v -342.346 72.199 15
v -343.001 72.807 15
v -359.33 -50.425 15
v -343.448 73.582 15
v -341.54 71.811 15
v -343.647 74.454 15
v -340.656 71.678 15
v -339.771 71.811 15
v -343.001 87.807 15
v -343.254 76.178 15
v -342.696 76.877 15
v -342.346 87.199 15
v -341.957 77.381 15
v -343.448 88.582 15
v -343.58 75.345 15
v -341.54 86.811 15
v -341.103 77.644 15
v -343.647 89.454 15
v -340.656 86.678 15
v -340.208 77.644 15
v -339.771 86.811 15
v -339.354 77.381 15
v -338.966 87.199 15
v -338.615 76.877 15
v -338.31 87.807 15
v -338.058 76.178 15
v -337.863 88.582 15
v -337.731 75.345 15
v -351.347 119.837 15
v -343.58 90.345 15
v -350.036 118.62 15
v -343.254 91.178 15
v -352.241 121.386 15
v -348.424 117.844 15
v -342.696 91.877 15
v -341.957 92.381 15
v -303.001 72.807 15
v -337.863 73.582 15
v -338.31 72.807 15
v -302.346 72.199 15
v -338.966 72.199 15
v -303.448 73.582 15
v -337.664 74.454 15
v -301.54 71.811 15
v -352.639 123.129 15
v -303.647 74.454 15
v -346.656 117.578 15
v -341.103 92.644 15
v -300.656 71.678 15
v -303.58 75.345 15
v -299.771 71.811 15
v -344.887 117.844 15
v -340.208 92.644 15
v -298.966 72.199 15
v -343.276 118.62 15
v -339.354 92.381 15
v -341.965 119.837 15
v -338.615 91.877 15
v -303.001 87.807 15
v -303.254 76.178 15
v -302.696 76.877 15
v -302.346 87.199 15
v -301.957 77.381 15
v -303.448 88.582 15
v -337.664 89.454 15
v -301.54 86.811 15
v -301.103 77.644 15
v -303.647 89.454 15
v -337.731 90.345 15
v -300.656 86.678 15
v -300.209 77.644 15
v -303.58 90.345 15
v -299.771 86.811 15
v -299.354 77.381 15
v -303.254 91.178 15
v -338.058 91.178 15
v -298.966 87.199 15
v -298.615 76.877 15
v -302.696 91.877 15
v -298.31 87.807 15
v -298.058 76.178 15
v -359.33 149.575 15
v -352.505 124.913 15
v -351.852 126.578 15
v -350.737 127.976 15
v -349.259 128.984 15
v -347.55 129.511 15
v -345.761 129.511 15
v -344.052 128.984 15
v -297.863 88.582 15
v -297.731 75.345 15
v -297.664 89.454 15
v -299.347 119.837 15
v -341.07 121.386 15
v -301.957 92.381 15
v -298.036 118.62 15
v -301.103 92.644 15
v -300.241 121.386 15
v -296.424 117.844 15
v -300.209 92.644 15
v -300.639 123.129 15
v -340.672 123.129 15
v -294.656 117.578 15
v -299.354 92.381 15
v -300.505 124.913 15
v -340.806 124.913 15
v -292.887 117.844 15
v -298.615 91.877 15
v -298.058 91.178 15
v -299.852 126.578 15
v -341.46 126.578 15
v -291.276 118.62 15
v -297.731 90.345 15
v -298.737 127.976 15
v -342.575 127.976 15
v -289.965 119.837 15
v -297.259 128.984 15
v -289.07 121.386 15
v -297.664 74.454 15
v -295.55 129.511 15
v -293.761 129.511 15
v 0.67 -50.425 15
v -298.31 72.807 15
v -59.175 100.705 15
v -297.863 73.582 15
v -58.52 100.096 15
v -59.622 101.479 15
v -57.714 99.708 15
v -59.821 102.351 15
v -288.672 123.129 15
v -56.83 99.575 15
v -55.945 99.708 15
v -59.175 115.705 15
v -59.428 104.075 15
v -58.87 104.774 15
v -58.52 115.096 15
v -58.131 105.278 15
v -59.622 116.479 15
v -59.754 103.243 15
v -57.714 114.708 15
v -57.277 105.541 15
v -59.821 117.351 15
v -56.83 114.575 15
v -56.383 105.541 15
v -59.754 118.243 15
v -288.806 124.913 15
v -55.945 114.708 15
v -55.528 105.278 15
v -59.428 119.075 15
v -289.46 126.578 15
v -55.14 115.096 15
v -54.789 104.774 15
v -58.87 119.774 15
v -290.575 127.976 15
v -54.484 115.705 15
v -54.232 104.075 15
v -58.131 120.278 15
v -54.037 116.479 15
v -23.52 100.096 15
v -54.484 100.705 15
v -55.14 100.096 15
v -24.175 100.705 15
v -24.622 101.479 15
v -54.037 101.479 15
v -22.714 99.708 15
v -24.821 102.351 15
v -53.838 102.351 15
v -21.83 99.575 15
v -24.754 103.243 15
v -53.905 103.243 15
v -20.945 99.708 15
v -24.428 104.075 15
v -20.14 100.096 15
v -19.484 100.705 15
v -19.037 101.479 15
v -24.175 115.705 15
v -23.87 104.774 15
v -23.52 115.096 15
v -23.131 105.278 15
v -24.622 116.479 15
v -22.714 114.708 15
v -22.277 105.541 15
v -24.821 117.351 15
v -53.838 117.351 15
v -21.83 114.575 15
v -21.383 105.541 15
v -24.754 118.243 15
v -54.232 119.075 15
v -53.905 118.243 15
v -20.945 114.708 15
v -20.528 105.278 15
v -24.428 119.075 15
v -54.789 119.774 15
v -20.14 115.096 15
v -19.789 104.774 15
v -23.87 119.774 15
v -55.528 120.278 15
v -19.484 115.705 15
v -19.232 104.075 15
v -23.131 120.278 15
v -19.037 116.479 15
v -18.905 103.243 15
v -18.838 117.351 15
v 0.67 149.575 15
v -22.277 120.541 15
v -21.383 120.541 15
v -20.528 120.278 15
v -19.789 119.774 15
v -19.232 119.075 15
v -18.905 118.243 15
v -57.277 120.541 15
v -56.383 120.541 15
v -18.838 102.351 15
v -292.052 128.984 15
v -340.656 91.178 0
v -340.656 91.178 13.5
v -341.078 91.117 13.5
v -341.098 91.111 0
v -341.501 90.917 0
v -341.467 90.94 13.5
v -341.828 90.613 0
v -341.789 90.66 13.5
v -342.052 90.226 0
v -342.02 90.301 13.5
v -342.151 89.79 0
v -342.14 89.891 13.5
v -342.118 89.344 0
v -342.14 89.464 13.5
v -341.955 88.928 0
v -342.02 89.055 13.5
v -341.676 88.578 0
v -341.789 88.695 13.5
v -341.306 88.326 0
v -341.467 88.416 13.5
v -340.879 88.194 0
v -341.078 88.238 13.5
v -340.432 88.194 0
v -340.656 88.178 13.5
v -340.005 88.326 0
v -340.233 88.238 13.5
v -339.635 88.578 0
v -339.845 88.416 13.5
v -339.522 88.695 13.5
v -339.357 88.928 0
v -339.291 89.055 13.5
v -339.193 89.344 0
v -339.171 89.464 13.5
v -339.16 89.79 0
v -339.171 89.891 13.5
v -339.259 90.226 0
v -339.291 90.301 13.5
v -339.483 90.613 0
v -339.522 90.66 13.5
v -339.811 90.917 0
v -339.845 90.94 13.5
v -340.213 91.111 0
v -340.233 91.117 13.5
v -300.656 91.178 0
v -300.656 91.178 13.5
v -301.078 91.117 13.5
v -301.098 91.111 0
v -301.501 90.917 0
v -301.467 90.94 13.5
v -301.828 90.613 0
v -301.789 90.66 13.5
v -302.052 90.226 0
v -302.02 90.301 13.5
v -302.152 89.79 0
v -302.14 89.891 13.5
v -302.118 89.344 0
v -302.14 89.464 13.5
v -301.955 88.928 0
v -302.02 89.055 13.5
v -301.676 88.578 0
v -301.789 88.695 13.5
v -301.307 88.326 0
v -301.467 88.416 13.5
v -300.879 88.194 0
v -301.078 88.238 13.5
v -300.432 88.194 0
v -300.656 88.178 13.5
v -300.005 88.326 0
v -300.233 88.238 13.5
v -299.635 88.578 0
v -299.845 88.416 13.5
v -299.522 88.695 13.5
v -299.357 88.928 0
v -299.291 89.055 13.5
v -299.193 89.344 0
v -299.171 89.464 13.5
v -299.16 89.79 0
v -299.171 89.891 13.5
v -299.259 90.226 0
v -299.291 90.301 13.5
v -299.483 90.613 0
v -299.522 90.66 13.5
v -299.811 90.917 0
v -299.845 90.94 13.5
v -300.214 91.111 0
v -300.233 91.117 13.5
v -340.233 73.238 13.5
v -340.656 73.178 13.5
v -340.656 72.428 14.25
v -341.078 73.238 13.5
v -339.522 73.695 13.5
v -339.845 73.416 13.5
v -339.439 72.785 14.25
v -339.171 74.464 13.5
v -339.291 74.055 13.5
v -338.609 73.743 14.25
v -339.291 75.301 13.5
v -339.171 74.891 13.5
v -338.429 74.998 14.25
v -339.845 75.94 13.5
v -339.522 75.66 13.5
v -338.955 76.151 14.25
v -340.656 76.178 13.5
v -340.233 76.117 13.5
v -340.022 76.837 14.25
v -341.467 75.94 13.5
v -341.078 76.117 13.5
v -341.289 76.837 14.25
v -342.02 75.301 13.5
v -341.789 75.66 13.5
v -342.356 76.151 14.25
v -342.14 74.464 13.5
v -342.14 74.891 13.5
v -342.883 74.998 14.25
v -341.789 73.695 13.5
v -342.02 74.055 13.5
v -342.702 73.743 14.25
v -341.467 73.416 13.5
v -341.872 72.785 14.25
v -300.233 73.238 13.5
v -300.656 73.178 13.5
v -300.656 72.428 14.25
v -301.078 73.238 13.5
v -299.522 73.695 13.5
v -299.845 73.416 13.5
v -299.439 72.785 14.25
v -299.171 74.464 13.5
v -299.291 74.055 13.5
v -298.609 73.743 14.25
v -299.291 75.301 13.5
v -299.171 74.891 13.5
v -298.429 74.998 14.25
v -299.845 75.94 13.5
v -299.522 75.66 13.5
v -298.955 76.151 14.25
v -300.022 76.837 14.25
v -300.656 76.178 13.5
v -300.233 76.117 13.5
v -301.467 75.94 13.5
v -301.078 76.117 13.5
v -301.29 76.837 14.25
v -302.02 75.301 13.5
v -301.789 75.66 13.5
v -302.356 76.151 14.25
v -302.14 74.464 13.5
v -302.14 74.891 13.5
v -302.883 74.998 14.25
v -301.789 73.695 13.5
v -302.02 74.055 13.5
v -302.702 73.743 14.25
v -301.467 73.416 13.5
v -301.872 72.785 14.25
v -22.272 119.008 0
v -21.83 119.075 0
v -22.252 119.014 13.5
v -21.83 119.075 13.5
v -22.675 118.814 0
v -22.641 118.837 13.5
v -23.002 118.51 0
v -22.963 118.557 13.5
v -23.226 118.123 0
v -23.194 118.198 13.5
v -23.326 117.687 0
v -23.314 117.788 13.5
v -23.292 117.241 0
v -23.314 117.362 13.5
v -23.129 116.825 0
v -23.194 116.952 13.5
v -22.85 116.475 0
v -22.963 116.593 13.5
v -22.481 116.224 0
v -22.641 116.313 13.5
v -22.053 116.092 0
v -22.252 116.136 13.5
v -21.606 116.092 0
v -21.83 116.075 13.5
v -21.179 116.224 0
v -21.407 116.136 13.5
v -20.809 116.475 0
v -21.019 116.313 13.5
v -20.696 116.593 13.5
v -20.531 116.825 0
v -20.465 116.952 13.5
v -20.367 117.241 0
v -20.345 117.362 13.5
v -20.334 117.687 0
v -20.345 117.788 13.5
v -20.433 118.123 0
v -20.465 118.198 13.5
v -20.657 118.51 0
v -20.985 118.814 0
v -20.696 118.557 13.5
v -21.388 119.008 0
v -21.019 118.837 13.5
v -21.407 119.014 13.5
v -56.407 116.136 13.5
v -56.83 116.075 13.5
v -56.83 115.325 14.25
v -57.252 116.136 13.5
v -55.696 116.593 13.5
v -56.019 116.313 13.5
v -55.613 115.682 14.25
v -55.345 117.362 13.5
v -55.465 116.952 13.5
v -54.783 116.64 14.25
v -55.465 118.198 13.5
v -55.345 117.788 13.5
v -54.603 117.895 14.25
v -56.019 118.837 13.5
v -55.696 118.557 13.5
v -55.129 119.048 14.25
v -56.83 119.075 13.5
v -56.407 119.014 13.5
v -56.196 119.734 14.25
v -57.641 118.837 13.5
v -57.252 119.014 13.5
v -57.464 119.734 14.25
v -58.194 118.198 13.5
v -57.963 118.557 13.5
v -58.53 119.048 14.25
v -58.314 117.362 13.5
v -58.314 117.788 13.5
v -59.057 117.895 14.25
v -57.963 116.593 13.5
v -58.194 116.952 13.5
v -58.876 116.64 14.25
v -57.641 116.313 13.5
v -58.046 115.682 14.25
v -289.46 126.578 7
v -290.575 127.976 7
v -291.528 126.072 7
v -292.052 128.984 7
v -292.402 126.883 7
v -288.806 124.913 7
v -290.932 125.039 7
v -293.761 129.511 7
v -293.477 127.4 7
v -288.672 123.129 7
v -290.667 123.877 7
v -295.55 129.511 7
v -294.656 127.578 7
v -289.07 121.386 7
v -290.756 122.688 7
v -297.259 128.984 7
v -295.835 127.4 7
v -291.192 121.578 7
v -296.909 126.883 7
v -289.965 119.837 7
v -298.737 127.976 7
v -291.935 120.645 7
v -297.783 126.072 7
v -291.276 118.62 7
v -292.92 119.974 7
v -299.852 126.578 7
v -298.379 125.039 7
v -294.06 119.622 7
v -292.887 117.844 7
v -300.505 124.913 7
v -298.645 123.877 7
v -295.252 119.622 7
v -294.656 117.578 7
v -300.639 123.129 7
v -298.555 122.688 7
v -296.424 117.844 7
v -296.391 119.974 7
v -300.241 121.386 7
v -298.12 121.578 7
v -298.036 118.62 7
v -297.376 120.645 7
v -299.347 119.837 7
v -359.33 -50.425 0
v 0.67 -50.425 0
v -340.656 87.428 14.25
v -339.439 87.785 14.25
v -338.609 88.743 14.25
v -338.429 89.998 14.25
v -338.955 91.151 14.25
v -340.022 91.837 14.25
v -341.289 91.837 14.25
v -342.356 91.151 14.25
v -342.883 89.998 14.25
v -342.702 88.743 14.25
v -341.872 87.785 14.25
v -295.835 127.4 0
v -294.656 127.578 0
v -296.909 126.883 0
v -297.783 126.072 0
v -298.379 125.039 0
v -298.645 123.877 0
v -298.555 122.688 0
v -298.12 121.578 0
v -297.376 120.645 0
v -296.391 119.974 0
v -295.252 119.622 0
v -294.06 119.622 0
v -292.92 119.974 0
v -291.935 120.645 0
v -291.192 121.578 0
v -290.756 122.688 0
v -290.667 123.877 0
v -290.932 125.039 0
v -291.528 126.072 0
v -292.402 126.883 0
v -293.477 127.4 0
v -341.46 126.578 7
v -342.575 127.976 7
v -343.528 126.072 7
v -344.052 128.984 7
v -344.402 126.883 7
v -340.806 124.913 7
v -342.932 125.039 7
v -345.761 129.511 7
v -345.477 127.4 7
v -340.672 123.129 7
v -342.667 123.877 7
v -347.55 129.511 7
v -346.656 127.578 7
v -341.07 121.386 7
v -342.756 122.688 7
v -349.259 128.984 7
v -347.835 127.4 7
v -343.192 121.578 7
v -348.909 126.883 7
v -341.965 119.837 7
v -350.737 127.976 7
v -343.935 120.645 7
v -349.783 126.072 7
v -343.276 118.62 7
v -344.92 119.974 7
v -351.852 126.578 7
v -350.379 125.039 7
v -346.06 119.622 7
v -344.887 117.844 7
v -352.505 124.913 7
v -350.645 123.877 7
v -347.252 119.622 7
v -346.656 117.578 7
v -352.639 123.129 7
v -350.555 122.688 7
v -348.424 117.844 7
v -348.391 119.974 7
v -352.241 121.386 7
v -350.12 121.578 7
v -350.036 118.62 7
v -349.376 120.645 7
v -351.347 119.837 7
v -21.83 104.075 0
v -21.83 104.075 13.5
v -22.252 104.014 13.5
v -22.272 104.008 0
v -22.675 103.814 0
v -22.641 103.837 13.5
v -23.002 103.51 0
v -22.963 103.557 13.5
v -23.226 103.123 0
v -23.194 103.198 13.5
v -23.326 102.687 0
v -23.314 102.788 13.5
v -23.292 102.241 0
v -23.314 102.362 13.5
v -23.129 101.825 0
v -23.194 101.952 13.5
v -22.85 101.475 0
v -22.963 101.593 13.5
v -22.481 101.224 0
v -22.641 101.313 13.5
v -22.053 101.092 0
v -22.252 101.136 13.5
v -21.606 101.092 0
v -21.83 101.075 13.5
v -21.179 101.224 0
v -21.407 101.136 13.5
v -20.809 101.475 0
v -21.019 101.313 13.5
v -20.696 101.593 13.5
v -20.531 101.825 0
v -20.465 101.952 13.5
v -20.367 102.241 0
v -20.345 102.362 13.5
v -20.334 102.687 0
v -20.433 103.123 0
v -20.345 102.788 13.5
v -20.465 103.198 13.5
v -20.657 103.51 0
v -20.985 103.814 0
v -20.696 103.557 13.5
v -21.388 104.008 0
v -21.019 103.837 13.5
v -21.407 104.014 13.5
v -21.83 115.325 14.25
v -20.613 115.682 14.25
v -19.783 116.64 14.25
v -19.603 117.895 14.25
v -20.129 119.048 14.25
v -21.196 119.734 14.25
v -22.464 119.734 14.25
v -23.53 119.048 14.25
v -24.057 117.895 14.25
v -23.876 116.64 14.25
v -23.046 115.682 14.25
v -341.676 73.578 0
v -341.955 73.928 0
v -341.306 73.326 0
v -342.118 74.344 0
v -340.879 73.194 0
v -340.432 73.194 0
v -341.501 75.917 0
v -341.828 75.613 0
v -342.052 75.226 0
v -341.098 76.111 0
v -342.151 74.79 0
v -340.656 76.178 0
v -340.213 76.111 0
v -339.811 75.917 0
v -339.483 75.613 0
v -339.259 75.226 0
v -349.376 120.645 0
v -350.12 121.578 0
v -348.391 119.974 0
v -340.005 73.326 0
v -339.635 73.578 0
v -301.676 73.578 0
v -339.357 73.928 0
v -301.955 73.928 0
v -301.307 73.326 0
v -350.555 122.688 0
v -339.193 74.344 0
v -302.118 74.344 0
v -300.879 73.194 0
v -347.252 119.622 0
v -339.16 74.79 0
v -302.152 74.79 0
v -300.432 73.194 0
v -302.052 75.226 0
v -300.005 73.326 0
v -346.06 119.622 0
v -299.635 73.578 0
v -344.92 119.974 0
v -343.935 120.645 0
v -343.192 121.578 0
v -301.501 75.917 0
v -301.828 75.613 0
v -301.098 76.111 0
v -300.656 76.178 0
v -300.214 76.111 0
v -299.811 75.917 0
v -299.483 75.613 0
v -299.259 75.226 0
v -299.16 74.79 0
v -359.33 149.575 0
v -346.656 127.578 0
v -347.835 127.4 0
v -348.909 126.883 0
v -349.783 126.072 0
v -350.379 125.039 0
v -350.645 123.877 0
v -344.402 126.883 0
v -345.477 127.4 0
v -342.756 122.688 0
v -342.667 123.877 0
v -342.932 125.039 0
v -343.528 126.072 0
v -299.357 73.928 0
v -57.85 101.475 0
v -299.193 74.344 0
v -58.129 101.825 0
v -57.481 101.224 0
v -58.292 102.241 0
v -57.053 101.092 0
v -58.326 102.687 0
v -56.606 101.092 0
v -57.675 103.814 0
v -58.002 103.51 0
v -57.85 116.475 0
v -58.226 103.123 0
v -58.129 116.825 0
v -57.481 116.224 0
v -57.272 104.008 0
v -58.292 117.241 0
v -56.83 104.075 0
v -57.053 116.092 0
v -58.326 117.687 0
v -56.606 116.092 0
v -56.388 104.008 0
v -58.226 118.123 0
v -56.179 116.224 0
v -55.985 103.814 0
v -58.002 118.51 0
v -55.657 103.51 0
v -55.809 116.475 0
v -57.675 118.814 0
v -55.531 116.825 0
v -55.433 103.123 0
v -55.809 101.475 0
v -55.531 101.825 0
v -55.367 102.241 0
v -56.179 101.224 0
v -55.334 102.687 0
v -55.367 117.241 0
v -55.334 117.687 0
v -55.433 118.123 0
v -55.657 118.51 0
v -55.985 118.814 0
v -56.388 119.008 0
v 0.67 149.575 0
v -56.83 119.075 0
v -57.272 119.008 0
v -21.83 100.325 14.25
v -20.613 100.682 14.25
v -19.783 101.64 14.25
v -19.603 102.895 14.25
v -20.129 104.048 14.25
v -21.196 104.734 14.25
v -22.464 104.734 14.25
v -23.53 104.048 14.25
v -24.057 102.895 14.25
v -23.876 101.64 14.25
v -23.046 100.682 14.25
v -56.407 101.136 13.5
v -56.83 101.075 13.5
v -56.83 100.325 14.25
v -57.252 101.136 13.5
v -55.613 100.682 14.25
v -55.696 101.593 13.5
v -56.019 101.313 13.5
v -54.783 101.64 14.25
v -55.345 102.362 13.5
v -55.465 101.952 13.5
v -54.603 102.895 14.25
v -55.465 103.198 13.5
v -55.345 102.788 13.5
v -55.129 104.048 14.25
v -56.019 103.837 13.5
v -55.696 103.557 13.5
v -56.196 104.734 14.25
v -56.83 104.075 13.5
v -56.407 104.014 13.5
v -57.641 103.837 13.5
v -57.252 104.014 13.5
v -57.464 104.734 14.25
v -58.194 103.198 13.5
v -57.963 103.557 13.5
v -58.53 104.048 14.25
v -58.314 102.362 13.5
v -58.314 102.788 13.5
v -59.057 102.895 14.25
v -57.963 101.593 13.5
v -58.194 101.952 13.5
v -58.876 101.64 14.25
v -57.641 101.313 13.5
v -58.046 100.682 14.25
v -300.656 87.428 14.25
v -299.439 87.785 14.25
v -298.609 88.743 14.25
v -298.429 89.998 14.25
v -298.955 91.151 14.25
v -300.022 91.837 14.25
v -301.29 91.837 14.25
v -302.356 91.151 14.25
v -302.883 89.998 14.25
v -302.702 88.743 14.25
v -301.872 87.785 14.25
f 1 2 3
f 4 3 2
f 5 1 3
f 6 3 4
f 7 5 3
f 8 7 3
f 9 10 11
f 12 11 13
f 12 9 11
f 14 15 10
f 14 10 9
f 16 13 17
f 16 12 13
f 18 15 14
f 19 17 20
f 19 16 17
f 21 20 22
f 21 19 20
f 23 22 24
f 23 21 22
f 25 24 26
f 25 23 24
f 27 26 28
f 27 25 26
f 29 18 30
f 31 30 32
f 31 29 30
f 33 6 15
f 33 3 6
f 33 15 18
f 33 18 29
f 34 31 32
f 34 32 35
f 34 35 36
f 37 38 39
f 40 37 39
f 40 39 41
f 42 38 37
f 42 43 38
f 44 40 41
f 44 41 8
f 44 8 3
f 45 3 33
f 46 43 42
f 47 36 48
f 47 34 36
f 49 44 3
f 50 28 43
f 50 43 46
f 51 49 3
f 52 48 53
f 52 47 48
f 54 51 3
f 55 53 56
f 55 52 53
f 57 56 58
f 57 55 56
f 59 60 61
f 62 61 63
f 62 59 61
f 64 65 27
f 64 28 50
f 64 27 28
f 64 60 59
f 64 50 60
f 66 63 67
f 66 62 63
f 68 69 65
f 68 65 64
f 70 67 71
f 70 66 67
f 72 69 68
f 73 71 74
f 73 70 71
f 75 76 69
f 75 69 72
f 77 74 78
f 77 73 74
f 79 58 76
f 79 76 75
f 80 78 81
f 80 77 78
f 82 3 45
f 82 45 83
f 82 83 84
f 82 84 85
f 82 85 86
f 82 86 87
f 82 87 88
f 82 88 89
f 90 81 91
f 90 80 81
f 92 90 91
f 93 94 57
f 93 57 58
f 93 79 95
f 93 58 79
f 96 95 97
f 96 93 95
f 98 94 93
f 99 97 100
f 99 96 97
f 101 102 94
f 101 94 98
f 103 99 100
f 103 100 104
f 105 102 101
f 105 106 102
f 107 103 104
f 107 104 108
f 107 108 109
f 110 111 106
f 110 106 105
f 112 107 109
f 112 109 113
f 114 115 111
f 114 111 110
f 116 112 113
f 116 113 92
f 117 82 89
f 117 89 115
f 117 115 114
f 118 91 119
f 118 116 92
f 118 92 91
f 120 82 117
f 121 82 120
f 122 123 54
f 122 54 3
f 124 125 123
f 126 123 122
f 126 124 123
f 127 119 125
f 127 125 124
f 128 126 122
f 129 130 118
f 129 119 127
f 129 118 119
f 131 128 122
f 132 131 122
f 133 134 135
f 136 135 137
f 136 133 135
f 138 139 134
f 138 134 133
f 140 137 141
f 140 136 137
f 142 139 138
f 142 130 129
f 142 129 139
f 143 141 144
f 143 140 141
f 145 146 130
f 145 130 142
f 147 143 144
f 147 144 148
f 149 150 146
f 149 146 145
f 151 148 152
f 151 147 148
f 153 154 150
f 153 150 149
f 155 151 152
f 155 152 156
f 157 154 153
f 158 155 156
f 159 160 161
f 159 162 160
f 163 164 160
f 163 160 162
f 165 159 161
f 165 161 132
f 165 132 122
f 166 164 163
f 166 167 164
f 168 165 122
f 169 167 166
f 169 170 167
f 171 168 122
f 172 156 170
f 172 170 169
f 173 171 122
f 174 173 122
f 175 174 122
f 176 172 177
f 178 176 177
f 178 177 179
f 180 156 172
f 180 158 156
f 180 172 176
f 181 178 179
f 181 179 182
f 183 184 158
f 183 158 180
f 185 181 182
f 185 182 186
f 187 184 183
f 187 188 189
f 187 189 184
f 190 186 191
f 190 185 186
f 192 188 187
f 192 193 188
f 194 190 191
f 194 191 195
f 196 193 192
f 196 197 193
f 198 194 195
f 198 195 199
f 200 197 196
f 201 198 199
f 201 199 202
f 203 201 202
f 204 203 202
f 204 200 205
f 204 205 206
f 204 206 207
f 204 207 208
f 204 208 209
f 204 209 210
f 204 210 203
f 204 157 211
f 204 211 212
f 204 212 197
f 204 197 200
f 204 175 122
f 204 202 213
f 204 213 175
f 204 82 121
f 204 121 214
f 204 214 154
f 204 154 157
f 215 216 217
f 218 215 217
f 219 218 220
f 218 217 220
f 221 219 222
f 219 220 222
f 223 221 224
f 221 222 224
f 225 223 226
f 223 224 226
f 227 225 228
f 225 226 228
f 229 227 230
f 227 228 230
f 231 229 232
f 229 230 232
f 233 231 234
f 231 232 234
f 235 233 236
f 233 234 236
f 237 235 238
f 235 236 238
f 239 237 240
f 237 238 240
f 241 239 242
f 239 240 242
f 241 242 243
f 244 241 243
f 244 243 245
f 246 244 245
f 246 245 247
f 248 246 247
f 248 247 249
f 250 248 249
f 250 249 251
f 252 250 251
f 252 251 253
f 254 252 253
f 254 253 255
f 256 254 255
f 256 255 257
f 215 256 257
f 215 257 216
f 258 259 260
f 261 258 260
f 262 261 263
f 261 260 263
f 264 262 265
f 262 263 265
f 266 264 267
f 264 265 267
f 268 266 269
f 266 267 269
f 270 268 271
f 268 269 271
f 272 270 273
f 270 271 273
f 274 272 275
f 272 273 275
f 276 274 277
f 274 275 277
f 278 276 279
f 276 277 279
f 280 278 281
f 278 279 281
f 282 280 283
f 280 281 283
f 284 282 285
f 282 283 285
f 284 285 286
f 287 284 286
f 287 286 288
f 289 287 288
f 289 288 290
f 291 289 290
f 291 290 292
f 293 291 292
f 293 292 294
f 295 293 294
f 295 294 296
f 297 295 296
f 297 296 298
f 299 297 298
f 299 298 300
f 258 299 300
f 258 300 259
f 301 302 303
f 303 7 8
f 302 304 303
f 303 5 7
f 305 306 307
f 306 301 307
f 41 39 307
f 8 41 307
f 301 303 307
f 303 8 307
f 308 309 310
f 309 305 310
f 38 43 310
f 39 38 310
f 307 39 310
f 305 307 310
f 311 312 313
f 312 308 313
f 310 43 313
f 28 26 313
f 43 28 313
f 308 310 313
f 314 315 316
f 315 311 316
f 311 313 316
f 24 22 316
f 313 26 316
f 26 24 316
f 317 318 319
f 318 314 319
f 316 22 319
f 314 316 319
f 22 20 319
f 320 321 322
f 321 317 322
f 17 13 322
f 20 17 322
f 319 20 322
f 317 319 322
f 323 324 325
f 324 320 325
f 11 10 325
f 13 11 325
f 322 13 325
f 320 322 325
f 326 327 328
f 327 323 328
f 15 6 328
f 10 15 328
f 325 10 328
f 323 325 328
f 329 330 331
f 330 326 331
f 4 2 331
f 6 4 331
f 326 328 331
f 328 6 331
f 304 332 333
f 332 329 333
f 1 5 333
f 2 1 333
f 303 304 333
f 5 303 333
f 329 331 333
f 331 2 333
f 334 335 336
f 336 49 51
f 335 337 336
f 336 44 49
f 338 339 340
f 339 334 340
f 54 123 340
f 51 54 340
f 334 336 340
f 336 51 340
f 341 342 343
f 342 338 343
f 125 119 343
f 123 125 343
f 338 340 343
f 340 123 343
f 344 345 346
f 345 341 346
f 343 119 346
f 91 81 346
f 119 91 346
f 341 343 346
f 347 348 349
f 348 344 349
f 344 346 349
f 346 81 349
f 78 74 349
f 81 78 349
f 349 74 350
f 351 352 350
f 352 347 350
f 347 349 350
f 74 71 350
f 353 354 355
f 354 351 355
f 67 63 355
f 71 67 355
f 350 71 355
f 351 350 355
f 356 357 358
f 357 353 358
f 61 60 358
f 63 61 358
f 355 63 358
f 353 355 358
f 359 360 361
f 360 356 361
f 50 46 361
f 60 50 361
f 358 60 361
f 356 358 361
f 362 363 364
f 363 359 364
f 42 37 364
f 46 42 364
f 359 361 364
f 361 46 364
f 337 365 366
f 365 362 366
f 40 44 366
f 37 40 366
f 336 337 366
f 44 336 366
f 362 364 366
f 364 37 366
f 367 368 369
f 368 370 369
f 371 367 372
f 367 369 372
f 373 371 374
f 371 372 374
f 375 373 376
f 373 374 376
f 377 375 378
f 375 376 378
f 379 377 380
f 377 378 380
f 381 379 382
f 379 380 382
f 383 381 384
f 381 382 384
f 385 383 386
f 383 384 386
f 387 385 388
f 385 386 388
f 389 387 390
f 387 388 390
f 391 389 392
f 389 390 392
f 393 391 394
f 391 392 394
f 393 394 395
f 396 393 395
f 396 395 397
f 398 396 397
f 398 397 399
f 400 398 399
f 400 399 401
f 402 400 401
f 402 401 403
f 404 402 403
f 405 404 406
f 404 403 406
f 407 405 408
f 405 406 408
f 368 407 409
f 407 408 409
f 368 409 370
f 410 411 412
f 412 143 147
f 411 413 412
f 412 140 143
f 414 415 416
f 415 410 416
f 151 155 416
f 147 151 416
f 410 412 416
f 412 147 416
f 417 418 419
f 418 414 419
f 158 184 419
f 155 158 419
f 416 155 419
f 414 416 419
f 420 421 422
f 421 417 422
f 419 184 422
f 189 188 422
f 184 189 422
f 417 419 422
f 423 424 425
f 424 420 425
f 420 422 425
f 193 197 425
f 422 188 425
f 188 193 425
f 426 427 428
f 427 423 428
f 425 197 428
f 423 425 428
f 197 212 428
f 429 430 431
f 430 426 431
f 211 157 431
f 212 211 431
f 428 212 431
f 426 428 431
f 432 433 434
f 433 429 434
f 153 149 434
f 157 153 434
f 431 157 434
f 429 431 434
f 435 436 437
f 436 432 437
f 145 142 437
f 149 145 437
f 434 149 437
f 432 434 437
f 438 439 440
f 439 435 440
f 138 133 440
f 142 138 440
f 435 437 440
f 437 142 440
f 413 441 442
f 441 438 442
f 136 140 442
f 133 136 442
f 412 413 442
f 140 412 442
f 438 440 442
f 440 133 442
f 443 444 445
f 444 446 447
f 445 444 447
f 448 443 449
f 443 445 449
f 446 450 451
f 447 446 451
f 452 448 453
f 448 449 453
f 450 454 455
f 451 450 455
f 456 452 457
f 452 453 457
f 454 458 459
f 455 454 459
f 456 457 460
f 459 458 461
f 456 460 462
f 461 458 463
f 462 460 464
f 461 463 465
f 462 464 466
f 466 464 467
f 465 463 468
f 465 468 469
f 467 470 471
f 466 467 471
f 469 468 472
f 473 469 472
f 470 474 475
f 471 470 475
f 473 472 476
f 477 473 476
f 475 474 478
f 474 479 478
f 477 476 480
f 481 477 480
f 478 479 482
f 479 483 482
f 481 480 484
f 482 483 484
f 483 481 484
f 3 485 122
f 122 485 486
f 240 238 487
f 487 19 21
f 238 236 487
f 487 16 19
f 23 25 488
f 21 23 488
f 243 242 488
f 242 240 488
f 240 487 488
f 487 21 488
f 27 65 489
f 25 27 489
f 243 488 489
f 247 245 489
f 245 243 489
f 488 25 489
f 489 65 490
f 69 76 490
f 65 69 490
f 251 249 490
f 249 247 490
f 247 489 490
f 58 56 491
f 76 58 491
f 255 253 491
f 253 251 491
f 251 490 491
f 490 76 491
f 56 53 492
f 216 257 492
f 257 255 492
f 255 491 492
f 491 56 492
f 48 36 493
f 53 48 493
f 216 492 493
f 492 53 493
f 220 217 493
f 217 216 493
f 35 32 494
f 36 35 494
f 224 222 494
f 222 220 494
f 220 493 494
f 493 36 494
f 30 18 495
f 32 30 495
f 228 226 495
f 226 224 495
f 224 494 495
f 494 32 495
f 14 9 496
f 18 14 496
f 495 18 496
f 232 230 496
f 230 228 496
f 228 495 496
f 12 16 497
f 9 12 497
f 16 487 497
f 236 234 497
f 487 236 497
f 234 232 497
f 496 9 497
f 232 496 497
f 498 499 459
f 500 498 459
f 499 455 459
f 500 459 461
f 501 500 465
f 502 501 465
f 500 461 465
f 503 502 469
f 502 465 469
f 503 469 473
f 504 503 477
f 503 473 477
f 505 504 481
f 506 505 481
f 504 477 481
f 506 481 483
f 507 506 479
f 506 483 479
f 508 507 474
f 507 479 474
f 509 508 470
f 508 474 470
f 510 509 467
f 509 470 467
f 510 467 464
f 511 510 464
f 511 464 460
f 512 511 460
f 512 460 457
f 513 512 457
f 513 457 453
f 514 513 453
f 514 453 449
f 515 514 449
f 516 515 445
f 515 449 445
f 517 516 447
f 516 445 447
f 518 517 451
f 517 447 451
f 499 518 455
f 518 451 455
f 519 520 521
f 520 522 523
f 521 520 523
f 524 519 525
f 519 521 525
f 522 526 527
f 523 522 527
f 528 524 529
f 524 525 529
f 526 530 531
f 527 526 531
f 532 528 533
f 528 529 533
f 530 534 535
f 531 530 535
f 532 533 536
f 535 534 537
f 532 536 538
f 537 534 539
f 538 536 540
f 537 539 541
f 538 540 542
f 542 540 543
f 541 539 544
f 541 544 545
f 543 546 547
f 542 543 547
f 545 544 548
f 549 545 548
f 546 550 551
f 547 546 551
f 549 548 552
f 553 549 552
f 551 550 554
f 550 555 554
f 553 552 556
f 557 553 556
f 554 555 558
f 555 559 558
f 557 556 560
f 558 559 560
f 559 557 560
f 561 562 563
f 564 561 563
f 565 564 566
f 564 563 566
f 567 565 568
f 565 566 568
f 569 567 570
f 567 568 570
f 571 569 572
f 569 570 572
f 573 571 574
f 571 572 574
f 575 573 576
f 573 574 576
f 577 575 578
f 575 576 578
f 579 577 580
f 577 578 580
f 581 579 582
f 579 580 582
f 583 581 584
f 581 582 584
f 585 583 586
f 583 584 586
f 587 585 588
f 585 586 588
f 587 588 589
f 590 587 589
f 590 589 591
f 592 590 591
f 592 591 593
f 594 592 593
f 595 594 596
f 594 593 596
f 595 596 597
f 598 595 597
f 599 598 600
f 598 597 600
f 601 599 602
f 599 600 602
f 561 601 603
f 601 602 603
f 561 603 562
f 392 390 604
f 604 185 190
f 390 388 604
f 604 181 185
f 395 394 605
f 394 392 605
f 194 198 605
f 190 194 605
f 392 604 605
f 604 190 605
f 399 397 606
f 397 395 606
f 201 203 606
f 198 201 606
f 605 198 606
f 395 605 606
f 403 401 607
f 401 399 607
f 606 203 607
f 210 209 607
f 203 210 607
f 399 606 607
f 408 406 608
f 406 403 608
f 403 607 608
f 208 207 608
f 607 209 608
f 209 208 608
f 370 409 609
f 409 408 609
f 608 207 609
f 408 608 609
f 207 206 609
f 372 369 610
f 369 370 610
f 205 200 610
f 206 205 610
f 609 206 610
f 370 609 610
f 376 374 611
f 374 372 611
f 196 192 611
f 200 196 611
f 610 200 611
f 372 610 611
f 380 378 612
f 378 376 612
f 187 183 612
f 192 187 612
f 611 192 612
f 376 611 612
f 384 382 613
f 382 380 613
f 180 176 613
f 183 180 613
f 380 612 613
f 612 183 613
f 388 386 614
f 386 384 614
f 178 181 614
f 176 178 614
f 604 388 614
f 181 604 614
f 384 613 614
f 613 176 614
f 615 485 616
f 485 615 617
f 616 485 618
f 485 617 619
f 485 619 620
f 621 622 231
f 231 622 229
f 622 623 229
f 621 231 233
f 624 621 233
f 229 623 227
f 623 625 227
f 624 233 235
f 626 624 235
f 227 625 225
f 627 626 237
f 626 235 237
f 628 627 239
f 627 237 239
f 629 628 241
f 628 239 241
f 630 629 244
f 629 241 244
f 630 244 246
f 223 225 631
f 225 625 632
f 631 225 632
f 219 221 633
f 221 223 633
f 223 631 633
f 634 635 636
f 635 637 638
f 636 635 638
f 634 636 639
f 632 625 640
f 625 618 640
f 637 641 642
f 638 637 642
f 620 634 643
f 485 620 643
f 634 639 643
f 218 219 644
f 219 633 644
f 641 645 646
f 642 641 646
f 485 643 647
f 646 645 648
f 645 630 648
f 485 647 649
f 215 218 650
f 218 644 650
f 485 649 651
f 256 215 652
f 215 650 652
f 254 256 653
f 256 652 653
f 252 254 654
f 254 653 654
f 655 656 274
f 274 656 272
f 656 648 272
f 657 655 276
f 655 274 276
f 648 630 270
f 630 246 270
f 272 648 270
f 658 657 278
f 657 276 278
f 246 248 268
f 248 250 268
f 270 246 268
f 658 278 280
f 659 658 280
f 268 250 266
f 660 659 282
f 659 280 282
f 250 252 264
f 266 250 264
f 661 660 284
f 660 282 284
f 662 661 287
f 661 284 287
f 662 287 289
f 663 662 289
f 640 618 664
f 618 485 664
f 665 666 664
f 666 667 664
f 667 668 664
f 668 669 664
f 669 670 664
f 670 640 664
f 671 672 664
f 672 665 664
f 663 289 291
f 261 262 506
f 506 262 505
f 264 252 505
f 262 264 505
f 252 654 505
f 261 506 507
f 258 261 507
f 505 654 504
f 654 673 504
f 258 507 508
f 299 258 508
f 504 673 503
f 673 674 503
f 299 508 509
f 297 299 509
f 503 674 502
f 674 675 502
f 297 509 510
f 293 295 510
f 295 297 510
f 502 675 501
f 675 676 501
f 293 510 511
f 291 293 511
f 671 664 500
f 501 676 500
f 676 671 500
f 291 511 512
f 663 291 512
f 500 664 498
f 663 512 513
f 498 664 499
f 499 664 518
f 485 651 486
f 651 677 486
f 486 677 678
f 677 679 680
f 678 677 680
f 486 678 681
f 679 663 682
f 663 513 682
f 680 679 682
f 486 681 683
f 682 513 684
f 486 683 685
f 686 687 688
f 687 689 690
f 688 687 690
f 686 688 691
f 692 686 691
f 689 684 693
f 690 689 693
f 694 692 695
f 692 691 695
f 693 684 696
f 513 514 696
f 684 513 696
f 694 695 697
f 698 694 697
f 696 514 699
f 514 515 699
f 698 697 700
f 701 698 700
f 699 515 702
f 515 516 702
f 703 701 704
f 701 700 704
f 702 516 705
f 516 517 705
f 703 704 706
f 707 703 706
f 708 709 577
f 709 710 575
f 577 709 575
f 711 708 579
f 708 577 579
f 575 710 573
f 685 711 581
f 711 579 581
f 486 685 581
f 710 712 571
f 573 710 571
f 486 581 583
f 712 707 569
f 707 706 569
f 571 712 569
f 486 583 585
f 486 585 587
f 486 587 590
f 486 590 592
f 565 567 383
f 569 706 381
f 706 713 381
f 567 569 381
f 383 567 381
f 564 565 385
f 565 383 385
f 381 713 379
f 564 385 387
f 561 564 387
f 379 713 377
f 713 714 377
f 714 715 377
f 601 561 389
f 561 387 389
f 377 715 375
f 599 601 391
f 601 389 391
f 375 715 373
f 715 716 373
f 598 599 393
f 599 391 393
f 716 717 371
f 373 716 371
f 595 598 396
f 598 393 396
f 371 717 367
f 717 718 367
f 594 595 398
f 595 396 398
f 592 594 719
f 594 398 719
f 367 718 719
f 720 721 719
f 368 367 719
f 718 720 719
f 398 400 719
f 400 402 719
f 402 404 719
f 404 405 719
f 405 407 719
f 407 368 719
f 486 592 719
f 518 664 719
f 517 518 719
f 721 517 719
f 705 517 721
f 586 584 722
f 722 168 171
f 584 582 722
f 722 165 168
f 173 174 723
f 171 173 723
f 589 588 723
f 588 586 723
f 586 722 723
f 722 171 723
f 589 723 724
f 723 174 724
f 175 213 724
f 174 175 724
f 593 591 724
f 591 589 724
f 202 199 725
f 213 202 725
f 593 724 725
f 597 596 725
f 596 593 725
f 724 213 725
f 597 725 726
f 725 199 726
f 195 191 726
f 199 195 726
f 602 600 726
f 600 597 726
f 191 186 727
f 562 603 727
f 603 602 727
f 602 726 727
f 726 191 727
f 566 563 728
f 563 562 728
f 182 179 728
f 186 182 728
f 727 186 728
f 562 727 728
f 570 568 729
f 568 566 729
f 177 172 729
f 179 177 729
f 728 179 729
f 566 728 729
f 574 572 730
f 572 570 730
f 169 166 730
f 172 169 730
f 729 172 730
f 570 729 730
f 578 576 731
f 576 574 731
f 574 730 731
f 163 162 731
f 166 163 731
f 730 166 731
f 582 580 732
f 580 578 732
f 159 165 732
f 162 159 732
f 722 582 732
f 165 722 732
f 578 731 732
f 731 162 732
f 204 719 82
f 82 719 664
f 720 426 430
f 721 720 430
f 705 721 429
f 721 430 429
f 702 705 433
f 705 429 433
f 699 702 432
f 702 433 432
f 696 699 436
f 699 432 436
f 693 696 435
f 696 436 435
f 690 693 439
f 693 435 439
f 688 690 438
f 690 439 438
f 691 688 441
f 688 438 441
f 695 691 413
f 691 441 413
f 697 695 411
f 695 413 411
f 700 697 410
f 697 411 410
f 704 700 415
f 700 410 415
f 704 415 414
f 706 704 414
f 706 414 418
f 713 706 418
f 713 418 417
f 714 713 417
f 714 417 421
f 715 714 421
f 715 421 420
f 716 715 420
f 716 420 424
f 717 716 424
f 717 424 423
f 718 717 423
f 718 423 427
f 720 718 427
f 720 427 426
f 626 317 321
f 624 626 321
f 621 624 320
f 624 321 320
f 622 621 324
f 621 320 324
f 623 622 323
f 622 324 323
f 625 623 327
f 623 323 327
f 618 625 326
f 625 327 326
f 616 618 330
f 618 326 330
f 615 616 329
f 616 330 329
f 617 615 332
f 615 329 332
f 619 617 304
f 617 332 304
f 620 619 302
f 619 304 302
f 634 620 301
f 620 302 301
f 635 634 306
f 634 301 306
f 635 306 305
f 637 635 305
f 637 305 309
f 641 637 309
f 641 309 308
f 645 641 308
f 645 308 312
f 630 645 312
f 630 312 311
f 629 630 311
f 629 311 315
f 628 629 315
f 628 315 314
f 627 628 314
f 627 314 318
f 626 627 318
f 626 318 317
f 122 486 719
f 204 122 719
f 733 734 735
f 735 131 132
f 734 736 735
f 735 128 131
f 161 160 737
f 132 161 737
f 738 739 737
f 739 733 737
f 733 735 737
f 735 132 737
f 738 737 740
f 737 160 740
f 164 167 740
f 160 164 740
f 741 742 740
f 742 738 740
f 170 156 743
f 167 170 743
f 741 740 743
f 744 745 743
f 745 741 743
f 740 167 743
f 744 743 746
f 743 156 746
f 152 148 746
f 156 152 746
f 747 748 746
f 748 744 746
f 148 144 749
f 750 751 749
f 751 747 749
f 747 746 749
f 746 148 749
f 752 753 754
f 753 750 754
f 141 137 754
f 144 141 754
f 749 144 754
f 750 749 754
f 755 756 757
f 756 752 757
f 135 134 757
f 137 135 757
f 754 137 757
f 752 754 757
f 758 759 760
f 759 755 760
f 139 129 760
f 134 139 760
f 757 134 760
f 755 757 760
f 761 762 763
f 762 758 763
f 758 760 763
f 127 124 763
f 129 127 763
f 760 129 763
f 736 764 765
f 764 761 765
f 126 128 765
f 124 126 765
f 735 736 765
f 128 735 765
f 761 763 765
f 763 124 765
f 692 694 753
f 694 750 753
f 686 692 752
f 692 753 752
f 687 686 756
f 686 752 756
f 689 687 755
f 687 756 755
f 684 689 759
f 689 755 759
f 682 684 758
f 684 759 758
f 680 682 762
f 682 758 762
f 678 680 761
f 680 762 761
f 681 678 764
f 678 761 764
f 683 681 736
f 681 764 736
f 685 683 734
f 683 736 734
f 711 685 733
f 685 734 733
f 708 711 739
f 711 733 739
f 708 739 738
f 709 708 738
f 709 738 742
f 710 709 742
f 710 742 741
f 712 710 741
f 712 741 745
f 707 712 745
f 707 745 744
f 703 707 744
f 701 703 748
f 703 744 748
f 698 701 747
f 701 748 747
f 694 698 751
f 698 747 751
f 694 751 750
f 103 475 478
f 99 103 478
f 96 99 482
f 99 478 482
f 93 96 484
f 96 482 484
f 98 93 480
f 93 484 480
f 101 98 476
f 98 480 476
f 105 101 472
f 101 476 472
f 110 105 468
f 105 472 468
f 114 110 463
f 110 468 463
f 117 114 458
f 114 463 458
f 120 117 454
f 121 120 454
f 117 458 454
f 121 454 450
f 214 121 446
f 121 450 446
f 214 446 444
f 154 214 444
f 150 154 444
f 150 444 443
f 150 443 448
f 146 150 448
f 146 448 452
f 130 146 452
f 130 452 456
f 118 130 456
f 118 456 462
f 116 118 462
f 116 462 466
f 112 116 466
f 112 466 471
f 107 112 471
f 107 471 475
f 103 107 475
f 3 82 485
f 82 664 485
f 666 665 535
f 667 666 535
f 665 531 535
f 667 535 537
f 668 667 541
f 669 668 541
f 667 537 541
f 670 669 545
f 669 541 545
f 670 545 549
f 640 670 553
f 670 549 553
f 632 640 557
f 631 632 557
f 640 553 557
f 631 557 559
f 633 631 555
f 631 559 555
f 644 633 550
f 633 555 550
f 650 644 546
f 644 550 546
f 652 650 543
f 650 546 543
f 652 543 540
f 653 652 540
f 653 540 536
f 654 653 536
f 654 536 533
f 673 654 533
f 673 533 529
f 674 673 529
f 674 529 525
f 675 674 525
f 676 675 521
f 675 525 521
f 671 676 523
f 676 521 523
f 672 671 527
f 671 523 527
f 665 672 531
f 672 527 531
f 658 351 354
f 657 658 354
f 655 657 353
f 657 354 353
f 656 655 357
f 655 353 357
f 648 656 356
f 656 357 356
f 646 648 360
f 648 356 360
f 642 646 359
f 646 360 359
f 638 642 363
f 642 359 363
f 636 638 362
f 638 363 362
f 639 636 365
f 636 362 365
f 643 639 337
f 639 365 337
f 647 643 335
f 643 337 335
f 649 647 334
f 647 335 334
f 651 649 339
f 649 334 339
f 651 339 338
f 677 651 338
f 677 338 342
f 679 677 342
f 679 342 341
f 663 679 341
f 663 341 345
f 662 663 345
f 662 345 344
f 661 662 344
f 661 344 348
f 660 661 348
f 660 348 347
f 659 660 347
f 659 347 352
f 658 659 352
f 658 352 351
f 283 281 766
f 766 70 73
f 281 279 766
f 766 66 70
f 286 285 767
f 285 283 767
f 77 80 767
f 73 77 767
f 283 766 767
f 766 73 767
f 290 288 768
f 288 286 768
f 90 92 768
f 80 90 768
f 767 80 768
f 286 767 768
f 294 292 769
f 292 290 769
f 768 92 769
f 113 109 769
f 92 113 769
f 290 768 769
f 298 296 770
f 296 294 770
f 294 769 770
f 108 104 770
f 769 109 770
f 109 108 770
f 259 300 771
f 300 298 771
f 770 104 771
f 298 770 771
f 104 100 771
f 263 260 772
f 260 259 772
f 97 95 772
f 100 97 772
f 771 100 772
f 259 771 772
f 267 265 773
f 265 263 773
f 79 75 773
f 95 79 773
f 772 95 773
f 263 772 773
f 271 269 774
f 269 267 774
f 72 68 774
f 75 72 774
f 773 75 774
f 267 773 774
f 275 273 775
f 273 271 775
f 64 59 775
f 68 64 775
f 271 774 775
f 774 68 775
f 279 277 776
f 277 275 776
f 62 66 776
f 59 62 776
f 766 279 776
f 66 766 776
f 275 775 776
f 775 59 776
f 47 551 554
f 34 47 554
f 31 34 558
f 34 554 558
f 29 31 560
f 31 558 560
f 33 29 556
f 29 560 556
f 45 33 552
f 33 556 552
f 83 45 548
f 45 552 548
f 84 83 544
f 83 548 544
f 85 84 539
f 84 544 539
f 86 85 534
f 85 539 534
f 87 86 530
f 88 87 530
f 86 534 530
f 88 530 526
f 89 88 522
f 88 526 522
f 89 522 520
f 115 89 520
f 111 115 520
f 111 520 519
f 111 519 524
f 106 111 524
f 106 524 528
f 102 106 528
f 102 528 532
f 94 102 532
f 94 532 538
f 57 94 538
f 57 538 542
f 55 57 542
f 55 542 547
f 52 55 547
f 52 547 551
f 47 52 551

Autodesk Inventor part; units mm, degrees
ref_plane "YZ Plane" through (0, 0, 0) normal (1, 0, 0) x (0, 1, 0)
ref_plane "XZ Plane" through (0, 0, 0) normal (0, 1, 0) x (-1, 0, 0)
ref_plane "XY Plane" through (0, 0, 0) normal (0, 0, 1) x (1, 0, 0)
sketch "Sketch1" plane through (0, 0, 0) normal (0, 0, 1) x (1, 0, 0)
  line L0 (0.6703, -50.425) -> (0.6703, 149.575)
  line L1 (0.6703, 149.575) -> (-359.3297, 149.575)
  line L2 (-359.3297, 149.575) -> (-359.3297, -50.425)
  line L3 (-359.3297, -50.425) -> (0.6703, -50.425)
  line L4 (0.6703, -50.425) -> (0.6703, 149.575)
  point P0 (0, 0)
  dimension "d67" = 360
extrude "Extrusion1" add sketch "Sketch1" along normal blind 15
sketch "Sketch7" plane through (0, 0, 0) normal (0, 0, -1) x (-1, 0, 0)
  line L0 (-0.6703, 149.575) -> (359.3297, 149.575) projected
  line L1 (-0.6703, 149.575) -> (359.3297, 149.575) projected
  line L2 (359.3297, 149.575) -> (359.3297, -50.425) projected
  line L3 (-0.6703, -50.425) -> (-0.6703, 149.575) projected
  line L4 (-0.6703, 149.575) -> (-0.6703, 129.575)
  line L5 (-0.6703, 149.575) -> (-0.6703, 119.575)
  line L6 (-0.6703, 119.575) -> (-0.6703, 117.575)
  circle A0 centre (56.8297, 102.575) radius 1.5
  circle A1 centre (56.8297, 117.575) radius 1.5
  circle A2 centre (21.8297, 102.575) radius 1.5
  circle A3 centre (21.8297, 117.575) radius 1.5
  line L7 (359.3297, 149.575) -> (359.3297, -50.425) projected
  line L8 (-0.6703, 117.575) -> (-0.6703, 119.575)
  line L9 (-0.6703, 117.575) -> (-0.6703, 120.575)
  circle A4 centre (300.6557, 89.6777) radius 1.59
  circle A5 centre (300.6557, 74.6777) radius 1.59
  line L10 (16.8297, 102.575) -> (21.8297, 102.575)
  point P0 (0, 0)
  point P1 (300.6557, 74.6777)
  point P2 (340.6556, 74.6777)
  point P3 (340.6556, 89.6777)
  point P4 (335.6556, 88.0877)
  dimension "d70" = 20
  dimension "d155" = 3
hole "Hole10" at (-56.8297, 102.575, 0) at (-56.8297, 117.575, 0) at (-21.8297, 117.575, 0) at (-21.8297, 102.575, 0) direction (0, 0, 1) diameter 3 end through all
hole "Hole11" at (-300.6557, 74.6777, 0) at (-300.6557, 89.6777, 0) at (-340.6556, 74.6777, 0) at (-340.6556, 89.6777, 0) direction (0, 0, 1) diameter 3 end through all
sketch "Sketch11" plane through (0, 0, 15) normal (0, 0, 1) x (1, 0, 0)
  circle A0 centre (-21.8297, 117.575) radius 1.5 projected
  circle A1 centre (-56.8297, 102.575) radius 1.5 projected
  circle A2 centre (-56.8297, 117.575) radius 1.5 projected
  circle A3 centre (-21.8297, 102.575) radius 1.5 projected
  line L0 (0.6703, -50.425) -> (0.6703, 149.575) projected
  line L1 (0.6703, 149.575) -> (-359.3297, 149.575) projected
  line L2 (-359.3297, 149.575) -> (-359.3297, -50.425) projected
  line L3 (-359.3297, -50.425) -> (0.6703, -50.425) projected
  circle A4 centre (-56.8297, 102.575) radius 1.5 projected
  circle A5 centre (-340.6556, 74.6777) radius 1.5 projected
  circle A6 centre (-340.6556, 89.6777) radius 1.5 projected
  circle A7 centre (-340.6556, 74.6777) radius 1.5 projected
  circle A8 centre (-300.6557, 74.6777) radius 1.5 projected
  circle A9 centre (-300.6557, 89.6777) radius 1.5 projected
  circle A10 centre (-340.6556, 89.6777) radius 1.5 projected
  circle A11 centre (-21.8297, 117.575) radius 1.5 projected
  circle A12 centre (-56.8297, 102.575) radius 1.5 projected
  circle A13 centre (-56.8297, 117.575) radius 1.5 projected
  circle A14 centre (-21.8297, 102.575) radius 1.5 projected
  line L4 (0.6703, -50.425) -> (0.6703, 149.575) projected
  line L5 (0.6703, 149.575) -> (-359.3297, 149.575) projected
  line L6 (-359.3297, 149.575) -> (-359.3297, -50.425) projected
  line L7 (-359.3297, -50.425) -> (0.6703, -50.425) projected
  point P0 (0, 0)
hole "Hole12" at (-56.8297, 117.575, 15) at (-56.8297, 102.575, 15) at (-21.8297, 102.575, 15) at (-21.8297, 117.575, 15) at (-300.6557, 74.6777, 15) at (-300.6557, 89.6777, 15) at (-340.6556, 89.6777, 15) at (-340.6556, 74.6777, 15) direction (0, 0, -1) diameter 3 end through all countersink diameter 6 countersink angle 90
sketch "Sketch12" plane through (0, 0, 0) normal (0, 0, -1) x (-1, 0, 0)
  circle A0 centre (294.6557, 123.5777) radius 4
  circle A1 centre (346.6557, 123.5777) radius 4
  point P0 (0, 0)
hole "Hole13" at (-294.6557, 123.5777, 0) at (-346.6557, 123.5777, 0) direction (0, 0, 1) diameter 8 end through all
sketch "Sketch13" plane through (0, 0, 15) normal (0, 0, 1) x (1, 0, 0)
  circle A0 centre (-346.6557, 123.5777) radius 4 projected
  circle A1 centre (-294.6557, 123.5777) radius 4 projected
  point P0 (0, 0)
hole "Hole14" at (-346.6557, 123.5777, 15) at (-294.6557, 123.5777, 15) direction (0, 0, -1) diameter 12 depth 8
properties part number "Base de mdf"
